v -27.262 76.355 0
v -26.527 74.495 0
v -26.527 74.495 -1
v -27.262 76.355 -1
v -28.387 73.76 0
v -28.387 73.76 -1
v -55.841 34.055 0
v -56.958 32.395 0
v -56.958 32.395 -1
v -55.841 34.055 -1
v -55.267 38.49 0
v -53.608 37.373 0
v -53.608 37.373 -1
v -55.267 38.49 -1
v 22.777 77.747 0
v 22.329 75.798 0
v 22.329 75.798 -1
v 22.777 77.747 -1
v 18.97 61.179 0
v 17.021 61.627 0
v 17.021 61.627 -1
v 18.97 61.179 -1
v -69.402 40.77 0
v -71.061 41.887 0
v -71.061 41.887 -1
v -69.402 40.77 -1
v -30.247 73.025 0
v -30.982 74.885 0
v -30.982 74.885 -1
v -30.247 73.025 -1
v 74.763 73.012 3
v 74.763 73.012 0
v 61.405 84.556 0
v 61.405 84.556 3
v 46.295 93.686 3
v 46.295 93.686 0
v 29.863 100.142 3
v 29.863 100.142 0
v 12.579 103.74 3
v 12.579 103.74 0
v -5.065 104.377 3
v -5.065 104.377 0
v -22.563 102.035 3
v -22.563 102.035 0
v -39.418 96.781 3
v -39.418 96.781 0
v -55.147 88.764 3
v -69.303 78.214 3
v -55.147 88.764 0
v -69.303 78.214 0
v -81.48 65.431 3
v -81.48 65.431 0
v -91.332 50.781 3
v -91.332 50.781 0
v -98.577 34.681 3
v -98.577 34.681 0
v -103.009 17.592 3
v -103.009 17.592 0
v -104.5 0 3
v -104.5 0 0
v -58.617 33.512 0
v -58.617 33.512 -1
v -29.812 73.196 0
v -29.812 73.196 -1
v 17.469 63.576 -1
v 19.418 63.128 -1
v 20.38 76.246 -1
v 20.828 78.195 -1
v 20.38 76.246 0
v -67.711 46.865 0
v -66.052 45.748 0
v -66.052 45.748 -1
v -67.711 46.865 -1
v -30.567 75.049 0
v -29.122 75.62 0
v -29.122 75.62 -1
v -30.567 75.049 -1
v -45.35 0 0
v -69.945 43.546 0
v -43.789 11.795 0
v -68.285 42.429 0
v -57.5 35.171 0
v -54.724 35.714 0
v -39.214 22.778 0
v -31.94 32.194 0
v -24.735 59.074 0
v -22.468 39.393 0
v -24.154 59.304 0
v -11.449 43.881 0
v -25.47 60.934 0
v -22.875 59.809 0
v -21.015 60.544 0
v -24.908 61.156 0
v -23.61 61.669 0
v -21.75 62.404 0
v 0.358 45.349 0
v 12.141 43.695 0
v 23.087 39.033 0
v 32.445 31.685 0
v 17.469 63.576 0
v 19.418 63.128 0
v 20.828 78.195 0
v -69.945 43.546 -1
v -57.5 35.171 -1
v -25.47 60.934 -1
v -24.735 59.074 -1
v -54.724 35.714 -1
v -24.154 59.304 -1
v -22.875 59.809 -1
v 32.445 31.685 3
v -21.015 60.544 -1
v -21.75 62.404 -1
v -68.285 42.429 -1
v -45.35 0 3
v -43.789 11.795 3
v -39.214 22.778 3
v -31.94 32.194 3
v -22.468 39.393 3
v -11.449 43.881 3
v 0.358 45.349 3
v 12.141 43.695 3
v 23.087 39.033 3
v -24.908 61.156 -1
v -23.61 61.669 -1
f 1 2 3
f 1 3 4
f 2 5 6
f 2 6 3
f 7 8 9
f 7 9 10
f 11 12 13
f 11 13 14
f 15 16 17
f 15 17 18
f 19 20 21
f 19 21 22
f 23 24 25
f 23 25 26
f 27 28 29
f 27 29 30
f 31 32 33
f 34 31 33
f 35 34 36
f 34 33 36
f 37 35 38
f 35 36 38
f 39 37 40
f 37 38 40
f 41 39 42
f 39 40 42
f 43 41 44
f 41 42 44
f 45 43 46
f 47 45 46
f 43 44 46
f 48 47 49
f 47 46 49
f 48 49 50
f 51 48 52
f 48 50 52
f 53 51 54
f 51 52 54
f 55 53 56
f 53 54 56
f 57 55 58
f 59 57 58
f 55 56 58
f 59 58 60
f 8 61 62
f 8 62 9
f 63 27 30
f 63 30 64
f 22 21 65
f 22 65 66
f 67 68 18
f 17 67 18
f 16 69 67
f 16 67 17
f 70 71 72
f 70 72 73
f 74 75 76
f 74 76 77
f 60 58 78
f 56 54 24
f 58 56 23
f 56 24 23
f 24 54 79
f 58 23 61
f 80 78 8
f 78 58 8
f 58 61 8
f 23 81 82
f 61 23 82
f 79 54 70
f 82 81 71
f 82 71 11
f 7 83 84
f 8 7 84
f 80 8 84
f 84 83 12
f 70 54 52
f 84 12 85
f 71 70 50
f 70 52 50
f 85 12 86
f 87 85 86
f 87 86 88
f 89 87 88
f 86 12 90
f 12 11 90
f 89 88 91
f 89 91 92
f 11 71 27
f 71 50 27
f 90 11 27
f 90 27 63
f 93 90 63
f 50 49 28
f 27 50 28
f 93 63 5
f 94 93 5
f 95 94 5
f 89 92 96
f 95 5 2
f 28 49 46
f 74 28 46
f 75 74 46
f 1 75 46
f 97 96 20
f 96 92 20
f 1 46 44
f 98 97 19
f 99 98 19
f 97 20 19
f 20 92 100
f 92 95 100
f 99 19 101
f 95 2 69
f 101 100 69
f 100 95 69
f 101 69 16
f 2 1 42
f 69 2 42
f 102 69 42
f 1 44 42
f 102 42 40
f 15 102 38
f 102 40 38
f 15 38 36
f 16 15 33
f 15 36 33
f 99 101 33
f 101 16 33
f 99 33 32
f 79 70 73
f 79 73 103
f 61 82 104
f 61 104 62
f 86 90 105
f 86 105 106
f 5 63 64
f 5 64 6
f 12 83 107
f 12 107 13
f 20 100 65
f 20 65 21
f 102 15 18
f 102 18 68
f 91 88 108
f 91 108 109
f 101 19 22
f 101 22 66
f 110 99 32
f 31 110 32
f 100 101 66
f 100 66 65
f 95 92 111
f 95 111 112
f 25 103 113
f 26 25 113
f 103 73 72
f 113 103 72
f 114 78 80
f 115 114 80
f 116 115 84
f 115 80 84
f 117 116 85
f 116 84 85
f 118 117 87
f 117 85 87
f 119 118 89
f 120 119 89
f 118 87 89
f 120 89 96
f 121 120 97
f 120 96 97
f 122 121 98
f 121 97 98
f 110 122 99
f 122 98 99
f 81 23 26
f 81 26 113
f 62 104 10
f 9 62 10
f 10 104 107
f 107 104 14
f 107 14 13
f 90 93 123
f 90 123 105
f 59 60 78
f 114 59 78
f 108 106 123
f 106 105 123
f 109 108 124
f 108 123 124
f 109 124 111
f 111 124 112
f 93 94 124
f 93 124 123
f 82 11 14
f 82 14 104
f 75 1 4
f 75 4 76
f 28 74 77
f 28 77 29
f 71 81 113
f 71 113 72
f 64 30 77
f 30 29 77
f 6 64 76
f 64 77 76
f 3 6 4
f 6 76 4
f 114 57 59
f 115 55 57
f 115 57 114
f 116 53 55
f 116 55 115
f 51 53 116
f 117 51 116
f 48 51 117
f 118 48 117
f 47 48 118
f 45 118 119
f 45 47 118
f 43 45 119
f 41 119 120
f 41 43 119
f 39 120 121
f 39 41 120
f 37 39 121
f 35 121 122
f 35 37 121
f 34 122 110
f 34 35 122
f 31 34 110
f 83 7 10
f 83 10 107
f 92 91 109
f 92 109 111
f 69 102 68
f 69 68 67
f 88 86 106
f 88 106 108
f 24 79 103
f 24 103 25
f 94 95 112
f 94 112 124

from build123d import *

# Parameters (mm, degrees)
F1_DEPTH = 3
F3_DEPTH = 4


with BuildPart() as f1:
    # F0 (on Top) → F1 (new body)
    with BuildSketch(Plane.XY):
        with BuildLine():
            Line((32.444928, 31.685156), (74.762845, 73.012102))
            ThreePointArc((74.762845, 73.012102), (-39.417843, 96.780595), (-104.5, 0))
            Line((-104.5, 0), (-45.35, 0))
            ThreePointArc((-45.35, 0), (-17.106212, 42), (32.444928, 31.685156))
        make_face()
    extrude(amount=F1_DEPTH)

    # F2 (on face) → F3 (join)
    with BuildSketch(Plane.XY.offset(3)):
        Polygon((-24.734859, 59.074202), (-24.153877, 59.303767), (-24.908327, 61.156129), (-25.46983, 60.93426), align=None)
        Polygon((-24.908327, 61.156129), (-24.153877, 59.303767), (-22.874801, 59.809172), (-21.014742, 60.544143), (-21.749713, 62.404202), (-23.609771, 61.669231), align=None)
        Polygon((-30.247139, 73.024641), (-29.812251, 73.19648), (-30.566701, 75.048842), (-30.98211, 74.8847), align=None)
        Polygon((-30.566701, 75.048842), (-29.812251, 73.19648), (-28.387081, 73.759612), (-26.527022, 74.494583), (-27.261993, 76.354641), (-29.122051, 75.619671), align=None)
        Polygon((-55.841003, 34.054731), (-54.724372, 35.713989), (-56.383629, 36.83062), (-57.50026, 35.171363), align=None)
        Polygon((-68.285433, 42.429465), (-67.168802, 44.088722), (-68.828059, 45.205353), (-69.94469, 43.546096), align=None)
        Polygon((-68.828059, 45.205353), (-67.168802, 44.088722), (-66.052171, 45.747979), (-67.711428, 46.86461), align=None)
        Polygon((-56.383629, 36.83062), (-54.724372, 35.713989), (-53.60774, 37.373246), (-55.266998, 38.489877), align=None)
        Polygon((-56.957634, 32.395474), (-55.841003, 34.054731), (-57.50026, 35.171363), (-58.616891, 33.512105), align=None)
        Polygon((-69.402064, 40.770207), (-68.285433, 42.429465), (-69.94469, 43.546096), (-71.061321, 41.886838), align=None)
        Polygon((22.776784, 77.747336), (20.827569, 78.195176), (20.379729, 76.245961), (22.328944, 75.798121), align=None)
        Polygon((19.417982, 63.128223), (17.468767, 63.576063), (17.020927, 61.626848), (18.970142, 61.179008), align=None)
    extrude(amount=-F3_DEPTH)


solid = f1.part
